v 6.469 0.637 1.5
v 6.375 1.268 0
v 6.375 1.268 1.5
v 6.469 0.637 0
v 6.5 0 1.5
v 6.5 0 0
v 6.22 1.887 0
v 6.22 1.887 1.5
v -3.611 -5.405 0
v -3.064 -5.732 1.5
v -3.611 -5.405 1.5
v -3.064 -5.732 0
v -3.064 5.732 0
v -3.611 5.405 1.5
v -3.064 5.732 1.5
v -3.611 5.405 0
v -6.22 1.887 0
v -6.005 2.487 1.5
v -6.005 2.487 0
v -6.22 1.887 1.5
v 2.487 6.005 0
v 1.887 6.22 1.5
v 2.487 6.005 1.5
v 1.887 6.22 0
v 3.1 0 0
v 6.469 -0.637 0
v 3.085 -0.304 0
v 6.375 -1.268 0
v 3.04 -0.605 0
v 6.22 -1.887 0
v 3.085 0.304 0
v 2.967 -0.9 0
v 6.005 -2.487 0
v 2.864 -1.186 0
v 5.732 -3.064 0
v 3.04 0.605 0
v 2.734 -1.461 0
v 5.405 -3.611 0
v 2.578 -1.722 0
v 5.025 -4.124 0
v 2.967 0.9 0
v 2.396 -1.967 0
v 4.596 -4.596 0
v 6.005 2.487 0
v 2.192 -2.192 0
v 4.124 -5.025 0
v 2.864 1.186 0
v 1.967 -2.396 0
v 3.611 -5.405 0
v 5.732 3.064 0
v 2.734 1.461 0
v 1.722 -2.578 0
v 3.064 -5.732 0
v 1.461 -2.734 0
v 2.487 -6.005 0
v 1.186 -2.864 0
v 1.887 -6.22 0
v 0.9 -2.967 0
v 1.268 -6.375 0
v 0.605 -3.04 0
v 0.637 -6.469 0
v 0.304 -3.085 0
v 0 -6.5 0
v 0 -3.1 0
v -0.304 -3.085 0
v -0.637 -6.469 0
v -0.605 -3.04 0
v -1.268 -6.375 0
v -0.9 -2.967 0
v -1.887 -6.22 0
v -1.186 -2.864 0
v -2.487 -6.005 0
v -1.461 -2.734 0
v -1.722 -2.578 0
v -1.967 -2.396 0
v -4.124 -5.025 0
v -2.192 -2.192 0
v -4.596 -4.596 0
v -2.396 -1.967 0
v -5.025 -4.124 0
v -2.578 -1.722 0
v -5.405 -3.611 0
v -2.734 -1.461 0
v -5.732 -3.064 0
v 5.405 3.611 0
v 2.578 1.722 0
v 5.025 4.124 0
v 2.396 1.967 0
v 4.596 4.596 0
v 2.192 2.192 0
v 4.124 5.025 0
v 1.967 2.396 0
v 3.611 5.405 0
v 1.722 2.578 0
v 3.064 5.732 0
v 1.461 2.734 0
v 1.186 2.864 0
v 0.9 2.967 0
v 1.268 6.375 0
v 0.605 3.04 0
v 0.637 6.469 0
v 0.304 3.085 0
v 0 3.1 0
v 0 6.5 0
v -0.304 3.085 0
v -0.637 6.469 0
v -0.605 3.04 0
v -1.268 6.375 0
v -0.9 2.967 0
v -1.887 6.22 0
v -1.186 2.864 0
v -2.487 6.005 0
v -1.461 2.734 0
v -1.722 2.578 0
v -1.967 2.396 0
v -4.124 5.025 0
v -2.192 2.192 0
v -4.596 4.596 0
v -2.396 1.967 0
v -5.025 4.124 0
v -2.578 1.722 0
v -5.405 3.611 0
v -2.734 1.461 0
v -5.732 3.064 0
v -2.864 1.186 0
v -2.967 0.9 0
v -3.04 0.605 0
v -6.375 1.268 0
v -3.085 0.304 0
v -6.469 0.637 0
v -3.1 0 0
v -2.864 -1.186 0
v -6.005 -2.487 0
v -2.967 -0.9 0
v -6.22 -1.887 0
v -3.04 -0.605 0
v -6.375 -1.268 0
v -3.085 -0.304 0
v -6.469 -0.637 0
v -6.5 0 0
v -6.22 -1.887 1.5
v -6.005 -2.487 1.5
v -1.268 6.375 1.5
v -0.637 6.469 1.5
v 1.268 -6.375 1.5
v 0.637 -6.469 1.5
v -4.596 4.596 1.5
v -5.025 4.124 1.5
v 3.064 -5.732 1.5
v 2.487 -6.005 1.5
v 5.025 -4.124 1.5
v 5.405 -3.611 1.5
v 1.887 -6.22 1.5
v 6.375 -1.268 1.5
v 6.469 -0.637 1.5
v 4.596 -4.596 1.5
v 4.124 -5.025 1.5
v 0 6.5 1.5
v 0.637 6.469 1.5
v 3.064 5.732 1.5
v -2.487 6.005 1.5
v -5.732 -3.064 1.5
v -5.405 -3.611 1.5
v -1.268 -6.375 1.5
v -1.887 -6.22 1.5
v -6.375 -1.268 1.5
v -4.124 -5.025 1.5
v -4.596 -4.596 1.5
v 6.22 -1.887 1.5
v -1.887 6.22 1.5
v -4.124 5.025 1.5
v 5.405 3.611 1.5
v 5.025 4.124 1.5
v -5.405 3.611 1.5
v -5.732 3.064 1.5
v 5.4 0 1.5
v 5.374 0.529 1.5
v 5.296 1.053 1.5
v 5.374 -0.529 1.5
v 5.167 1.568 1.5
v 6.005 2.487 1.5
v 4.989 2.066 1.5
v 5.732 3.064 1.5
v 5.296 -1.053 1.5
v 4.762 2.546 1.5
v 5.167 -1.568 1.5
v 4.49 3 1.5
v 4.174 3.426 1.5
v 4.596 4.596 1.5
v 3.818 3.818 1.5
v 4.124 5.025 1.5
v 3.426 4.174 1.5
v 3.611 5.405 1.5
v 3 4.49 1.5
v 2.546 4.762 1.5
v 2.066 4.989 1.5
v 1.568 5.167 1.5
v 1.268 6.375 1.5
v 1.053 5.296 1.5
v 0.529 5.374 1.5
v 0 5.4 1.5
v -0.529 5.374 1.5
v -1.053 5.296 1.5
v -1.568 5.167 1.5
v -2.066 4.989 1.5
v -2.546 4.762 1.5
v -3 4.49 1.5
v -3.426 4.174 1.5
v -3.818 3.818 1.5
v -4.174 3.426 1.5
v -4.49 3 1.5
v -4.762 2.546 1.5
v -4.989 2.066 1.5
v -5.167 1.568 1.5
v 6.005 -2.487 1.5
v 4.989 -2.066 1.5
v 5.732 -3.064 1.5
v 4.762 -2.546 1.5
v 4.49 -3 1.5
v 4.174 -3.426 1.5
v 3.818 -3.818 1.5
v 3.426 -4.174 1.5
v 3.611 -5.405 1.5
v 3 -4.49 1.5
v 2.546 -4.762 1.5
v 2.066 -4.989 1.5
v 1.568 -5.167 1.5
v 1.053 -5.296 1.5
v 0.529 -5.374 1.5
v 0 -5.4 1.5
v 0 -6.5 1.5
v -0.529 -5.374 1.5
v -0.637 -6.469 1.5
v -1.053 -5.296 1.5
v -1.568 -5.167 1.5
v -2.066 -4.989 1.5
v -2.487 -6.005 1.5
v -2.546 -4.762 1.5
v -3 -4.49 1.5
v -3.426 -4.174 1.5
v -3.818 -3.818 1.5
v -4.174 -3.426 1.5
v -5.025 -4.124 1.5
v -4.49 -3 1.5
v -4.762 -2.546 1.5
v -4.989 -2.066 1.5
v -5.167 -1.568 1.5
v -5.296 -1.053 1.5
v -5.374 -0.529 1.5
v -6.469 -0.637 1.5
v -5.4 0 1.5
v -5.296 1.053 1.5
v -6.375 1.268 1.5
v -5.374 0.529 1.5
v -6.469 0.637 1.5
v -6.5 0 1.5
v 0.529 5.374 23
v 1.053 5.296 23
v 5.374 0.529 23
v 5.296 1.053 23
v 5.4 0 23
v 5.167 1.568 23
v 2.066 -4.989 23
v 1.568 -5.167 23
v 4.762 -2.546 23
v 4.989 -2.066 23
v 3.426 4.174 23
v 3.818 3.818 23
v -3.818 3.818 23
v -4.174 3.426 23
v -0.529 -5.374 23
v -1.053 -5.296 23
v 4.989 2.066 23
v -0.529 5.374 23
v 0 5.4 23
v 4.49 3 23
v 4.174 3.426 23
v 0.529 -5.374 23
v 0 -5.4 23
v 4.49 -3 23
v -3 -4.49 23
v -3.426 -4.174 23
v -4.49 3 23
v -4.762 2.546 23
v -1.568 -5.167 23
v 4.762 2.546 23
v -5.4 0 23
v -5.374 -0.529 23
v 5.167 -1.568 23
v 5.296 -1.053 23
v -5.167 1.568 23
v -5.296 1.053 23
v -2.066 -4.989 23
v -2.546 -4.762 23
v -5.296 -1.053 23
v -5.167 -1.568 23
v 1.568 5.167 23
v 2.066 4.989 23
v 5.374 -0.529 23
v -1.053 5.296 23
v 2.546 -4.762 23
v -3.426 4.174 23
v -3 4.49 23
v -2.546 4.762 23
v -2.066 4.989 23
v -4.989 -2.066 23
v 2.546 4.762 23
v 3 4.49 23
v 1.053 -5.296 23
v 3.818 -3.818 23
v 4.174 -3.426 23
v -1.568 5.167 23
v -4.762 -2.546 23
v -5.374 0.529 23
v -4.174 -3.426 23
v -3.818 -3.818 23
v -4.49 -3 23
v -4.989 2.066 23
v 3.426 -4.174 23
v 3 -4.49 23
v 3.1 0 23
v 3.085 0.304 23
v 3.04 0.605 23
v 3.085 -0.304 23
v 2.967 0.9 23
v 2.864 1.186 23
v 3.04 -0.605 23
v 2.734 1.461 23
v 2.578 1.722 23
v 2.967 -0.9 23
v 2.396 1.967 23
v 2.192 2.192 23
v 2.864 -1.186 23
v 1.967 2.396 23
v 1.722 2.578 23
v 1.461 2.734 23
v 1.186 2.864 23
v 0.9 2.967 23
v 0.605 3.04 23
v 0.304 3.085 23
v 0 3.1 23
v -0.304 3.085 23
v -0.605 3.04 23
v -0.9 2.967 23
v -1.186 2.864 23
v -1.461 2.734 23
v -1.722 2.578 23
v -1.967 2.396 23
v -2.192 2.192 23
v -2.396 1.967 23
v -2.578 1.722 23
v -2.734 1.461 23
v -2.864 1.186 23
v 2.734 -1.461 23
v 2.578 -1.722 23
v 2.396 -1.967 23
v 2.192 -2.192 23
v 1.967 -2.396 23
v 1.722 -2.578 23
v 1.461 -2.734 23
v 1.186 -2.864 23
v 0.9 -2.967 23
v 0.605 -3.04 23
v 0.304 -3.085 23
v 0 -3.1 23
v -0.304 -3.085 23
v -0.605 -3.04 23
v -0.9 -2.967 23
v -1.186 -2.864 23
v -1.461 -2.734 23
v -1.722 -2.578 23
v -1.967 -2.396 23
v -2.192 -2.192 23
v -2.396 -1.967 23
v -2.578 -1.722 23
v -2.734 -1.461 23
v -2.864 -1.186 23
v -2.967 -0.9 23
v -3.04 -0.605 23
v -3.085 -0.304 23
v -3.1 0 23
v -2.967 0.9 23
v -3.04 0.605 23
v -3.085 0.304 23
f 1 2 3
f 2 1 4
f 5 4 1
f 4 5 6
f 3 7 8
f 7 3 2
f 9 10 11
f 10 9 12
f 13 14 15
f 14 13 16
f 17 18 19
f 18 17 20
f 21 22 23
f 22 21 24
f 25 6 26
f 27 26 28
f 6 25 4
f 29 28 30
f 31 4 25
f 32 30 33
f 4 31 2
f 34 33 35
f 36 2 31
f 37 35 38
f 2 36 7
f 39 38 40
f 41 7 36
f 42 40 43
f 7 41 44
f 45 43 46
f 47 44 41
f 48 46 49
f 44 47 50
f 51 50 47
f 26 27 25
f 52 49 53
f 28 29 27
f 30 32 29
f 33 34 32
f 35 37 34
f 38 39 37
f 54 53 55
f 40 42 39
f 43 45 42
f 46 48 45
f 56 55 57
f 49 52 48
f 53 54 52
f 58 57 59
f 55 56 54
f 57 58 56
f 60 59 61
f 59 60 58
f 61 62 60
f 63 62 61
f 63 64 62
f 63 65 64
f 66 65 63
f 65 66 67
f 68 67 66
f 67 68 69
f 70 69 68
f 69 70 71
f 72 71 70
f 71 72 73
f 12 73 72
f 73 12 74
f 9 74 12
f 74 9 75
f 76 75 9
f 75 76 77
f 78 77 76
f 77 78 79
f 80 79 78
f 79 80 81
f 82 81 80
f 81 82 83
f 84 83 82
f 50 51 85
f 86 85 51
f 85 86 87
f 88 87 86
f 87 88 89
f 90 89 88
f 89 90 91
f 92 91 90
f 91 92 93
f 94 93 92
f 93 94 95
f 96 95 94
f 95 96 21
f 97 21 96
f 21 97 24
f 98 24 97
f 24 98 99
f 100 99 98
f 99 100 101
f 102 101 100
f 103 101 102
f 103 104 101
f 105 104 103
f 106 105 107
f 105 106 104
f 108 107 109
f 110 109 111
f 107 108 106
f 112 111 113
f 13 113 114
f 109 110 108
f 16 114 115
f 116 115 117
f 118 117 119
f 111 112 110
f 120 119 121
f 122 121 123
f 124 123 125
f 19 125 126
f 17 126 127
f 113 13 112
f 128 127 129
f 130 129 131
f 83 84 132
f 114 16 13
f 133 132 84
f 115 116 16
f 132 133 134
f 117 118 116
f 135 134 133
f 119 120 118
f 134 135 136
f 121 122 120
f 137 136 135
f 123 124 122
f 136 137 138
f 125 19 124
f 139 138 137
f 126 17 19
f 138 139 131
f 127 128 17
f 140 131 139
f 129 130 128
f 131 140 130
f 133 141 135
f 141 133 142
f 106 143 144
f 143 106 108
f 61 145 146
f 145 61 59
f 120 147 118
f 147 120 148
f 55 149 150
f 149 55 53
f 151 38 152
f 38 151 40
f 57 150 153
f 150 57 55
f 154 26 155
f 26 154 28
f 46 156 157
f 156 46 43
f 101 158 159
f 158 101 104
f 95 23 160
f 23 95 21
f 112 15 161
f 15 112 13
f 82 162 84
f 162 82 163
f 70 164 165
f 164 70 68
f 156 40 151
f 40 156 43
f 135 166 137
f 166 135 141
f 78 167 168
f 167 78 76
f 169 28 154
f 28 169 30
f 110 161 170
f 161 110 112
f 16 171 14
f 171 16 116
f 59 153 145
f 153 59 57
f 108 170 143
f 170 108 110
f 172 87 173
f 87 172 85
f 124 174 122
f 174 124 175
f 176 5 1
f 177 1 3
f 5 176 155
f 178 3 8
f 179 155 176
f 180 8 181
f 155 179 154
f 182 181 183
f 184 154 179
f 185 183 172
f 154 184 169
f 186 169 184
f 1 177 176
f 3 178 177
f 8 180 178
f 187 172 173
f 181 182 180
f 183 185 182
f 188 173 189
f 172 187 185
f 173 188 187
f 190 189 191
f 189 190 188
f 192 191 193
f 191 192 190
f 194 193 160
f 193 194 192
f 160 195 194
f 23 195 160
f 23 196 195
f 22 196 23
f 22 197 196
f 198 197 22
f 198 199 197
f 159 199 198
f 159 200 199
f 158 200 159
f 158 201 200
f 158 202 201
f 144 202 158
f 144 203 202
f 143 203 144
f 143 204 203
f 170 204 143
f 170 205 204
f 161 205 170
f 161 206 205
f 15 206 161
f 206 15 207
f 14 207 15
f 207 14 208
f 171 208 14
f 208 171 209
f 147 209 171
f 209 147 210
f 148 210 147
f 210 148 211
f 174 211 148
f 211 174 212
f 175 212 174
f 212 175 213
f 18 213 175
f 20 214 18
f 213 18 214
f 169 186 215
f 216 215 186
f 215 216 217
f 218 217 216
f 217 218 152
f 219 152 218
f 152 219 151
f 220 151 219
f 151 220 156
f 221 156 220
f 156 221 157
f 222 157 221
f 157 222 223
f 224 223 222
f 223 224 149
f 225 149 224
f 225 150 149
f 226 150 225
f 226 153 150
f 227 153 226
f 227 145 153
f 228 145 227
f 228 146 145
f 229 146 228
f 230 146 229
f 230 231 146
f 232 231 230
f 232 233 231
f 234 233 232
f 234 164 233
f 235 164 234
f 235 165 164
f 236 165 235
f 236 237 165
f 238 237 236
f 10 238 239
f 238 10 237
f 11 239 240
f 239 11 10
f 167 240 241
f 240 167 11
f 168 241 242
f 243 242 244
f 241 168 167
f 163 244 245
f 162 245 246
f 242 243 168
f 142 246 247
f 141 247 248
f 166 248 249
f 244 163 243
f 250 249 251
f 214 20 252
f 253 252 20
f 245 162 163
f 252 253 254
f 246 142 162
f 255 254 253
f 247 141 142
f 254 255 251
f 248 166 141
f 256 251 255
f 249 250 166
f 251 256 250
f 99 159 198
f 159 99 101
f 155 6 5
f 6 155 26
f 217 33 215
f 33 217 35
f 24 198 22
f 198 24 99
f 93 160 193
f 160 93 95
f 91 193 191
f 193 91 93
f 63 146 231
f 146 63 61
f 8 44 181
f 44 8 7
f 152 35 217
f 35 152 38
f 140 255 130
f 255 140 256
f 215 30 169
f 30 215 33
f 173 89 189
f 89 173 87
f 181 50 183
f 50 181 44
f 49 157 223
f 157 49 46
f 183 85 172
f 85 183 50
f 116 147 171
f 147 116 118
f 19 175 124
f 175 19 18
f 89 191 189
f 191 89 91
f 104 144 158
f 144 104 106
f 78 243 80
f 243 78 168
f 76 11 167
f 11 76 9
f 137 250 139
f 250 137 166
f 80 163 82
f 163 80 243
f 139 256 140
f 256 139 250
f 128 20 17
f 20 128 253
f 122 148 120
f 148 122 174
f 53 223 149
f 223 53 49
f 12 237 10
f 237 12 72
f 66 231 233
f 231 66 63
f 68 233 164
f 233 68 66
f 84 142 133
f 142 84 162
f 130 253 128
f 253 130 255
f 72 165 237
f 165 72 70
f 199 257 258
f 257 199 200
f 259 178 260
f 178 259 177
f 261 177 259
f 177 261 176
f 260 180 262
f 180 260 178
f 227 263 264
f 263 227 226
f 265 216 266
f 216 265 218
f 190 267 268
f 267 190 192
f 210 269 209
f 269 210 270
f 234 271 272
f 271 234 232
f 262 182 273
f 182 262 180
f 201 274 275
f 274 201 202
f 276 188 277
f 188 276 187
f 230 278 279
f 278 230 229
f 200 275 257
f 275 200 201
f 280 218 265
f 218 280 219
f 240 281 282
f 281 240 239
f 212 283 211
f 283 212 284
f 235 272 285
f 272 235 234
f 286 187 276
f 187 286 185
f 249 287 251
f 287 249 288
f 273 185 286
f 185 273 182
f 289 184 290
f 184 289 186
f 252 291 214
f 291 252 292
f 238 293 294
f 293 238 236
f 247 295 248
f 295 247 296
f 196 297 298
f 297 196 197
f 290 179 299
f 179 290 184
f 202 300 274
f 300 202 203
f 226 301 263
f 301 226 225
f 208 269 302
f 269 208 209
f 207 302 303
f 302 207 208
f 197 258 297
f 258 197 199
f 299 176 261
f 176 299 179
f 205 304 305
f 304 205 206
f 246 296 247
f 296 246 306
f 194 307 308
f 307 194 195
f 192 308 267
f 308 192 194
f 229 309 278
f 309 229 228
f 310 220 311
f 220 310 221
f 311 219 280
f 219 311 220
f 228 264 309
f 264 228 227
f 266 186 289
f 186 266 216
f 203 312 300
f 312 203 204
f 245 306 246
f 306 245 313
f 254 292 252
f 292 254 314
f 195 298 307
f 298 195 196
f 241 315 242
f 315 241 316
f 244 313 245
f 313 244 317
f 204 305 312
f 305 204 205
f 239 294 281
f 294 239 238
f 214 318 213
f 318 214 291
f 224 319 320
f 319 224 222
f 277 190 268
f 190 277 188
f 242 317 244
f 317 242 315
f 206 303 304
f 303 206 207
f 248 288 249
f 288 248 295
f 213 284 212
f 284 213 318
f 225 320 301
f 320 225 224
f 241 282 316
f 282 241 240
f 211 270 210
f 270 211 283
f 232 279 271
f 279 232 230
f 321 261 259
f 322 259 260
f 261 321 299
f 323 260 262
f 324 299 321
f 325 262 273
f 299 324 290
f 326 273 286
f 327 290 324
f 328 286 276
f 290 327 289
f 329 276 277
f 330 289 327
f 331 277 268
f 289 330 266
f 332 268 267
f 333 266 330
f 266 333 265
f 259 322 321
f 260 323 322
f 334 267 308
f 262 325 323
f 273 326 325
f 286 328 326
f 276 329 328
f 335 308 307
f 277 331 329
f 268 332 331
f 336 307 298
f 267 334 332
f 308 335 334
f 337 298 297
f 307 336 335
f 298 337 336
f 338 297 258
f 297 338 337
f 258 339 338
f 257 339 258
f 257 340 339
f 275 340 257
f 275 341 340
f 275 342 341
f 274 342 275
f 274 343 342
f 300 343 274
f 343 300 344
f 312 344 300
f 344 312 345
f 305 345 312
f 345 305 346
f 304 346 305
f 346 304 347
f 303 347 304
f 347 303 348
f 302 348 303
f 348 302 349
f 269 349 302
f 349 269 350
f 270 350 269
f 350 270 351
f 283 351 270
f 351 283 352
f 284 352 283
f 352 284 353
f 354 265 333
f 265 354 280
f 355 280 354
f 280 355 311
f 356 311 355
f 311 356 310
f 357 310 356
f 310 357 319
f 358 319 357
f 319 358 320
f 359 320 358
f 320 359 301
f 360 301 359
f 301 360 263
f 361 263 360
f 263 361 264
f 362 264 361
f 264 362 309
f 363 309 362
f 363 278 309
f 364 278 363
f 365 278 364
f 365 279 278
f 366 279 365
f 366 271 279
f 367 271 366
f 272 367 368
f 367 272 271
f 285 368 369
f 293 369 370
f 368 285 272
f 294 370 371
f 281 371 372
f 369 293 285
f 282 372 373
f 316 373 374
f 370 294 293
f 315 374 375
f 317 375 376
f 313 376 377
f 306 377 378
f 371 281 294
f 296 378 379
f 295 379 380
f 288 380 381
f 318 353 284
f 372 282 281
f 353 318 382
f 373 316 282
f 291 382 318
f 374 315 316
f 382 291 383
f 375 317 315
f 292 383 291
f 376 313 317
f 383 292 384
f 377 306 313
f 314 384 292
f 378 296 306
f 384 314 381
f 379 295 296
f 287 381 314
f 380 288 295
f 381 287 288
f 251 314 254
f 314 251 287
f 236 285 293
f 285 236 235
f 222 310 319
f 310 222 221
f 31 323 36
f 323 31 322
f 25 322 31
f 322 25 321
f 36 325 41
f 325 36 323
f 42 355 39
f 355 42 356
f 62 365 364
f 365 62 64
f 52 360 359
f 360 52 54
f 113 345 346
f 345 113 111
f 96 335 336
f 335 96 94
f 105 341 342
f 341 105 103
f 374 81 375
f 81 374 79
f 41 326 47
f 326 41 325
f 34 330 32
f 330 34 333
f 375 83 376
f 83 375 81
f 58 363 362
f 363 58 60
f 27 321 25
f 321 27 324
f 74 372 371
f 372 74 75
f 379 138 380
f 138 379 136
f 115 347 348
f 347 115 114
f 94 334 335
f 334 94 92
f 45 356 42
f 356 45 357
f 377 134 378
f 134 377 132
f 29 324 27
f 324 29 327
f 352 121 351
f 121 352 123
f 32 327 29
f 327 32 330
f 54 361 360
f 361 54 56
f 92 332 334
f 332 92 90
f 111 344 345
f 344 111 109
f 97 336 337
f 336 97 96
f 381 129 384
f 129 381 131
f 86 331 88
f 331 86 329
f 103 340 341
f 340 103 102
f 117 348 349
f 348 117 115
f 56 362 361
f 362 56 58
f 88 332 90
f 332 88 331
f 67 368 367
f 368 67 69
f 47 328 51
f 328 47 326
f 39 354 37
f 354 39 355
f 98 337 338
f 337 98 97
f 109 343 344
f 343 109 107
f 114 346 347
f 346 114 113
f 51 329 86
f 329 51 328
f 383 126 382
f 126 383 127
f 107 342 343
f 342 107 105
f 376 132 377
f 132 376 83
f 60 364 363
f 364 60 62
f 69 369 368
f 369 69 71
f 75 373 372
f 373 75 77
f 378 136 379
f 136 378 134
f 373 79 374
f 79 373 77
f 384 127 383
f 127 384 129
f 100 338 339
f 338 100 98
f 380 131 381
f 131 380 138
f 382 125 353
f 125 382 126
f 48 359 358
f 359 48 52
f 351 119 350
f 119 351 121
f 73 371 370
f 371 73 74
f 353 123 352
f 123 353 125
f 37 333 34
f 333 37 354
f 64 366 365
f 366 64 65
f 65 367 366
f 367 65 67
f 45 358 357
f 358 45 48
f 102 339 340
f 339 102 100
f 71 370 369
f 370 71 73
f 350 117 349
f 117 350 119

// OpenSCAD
// PCR Tube Adapter Sleeve - fits a 0.2 mL tube into a 1.5 mL rack hole.
// Print orientation: Collar on bed (z=0 to 1.5), body rises to z=21.5.

// Dimensions
collar_od   = 13;      // Outer diameter of the collar
collar_t    = 1.5;     // Thickness of the collar
body_od     = 10.8;    // Outer diameter of the sleeve body
body_h      = 21.5;    // Total height of the body (from top of collar)
bore_d      = 6.2;     // Diameter of the straight bore

// Derived dimensions
collar_z_top = collar_t;
body_z_start = collar_z_top;
body_z_end   = body_z_start + body_h;
total_height = body_z_end;

// Overcuts for clean printing (Rule 5)
overcut = 0.1;

$fn = 64;

difference() {
    union() {
        // 1. The Collar (lies on the bed)
        translate([0, 0, 0]) 
            cylinder(h = collar_t, d = collar_od);

        // 2. The Sleeve Body (rises from the collar)
        translate([0, 0, collar_z_top]) 
            cylinder(h = body_h, d = body_od);
    }

    // 3. The Bore (straight hole through the full height)
    // Extends slightly past top and bottom to ensure it is open
    translate([0, 0, -overcut]) 
        cylinder(h = total_height + 2 * overcut, d = bore_d);
}
